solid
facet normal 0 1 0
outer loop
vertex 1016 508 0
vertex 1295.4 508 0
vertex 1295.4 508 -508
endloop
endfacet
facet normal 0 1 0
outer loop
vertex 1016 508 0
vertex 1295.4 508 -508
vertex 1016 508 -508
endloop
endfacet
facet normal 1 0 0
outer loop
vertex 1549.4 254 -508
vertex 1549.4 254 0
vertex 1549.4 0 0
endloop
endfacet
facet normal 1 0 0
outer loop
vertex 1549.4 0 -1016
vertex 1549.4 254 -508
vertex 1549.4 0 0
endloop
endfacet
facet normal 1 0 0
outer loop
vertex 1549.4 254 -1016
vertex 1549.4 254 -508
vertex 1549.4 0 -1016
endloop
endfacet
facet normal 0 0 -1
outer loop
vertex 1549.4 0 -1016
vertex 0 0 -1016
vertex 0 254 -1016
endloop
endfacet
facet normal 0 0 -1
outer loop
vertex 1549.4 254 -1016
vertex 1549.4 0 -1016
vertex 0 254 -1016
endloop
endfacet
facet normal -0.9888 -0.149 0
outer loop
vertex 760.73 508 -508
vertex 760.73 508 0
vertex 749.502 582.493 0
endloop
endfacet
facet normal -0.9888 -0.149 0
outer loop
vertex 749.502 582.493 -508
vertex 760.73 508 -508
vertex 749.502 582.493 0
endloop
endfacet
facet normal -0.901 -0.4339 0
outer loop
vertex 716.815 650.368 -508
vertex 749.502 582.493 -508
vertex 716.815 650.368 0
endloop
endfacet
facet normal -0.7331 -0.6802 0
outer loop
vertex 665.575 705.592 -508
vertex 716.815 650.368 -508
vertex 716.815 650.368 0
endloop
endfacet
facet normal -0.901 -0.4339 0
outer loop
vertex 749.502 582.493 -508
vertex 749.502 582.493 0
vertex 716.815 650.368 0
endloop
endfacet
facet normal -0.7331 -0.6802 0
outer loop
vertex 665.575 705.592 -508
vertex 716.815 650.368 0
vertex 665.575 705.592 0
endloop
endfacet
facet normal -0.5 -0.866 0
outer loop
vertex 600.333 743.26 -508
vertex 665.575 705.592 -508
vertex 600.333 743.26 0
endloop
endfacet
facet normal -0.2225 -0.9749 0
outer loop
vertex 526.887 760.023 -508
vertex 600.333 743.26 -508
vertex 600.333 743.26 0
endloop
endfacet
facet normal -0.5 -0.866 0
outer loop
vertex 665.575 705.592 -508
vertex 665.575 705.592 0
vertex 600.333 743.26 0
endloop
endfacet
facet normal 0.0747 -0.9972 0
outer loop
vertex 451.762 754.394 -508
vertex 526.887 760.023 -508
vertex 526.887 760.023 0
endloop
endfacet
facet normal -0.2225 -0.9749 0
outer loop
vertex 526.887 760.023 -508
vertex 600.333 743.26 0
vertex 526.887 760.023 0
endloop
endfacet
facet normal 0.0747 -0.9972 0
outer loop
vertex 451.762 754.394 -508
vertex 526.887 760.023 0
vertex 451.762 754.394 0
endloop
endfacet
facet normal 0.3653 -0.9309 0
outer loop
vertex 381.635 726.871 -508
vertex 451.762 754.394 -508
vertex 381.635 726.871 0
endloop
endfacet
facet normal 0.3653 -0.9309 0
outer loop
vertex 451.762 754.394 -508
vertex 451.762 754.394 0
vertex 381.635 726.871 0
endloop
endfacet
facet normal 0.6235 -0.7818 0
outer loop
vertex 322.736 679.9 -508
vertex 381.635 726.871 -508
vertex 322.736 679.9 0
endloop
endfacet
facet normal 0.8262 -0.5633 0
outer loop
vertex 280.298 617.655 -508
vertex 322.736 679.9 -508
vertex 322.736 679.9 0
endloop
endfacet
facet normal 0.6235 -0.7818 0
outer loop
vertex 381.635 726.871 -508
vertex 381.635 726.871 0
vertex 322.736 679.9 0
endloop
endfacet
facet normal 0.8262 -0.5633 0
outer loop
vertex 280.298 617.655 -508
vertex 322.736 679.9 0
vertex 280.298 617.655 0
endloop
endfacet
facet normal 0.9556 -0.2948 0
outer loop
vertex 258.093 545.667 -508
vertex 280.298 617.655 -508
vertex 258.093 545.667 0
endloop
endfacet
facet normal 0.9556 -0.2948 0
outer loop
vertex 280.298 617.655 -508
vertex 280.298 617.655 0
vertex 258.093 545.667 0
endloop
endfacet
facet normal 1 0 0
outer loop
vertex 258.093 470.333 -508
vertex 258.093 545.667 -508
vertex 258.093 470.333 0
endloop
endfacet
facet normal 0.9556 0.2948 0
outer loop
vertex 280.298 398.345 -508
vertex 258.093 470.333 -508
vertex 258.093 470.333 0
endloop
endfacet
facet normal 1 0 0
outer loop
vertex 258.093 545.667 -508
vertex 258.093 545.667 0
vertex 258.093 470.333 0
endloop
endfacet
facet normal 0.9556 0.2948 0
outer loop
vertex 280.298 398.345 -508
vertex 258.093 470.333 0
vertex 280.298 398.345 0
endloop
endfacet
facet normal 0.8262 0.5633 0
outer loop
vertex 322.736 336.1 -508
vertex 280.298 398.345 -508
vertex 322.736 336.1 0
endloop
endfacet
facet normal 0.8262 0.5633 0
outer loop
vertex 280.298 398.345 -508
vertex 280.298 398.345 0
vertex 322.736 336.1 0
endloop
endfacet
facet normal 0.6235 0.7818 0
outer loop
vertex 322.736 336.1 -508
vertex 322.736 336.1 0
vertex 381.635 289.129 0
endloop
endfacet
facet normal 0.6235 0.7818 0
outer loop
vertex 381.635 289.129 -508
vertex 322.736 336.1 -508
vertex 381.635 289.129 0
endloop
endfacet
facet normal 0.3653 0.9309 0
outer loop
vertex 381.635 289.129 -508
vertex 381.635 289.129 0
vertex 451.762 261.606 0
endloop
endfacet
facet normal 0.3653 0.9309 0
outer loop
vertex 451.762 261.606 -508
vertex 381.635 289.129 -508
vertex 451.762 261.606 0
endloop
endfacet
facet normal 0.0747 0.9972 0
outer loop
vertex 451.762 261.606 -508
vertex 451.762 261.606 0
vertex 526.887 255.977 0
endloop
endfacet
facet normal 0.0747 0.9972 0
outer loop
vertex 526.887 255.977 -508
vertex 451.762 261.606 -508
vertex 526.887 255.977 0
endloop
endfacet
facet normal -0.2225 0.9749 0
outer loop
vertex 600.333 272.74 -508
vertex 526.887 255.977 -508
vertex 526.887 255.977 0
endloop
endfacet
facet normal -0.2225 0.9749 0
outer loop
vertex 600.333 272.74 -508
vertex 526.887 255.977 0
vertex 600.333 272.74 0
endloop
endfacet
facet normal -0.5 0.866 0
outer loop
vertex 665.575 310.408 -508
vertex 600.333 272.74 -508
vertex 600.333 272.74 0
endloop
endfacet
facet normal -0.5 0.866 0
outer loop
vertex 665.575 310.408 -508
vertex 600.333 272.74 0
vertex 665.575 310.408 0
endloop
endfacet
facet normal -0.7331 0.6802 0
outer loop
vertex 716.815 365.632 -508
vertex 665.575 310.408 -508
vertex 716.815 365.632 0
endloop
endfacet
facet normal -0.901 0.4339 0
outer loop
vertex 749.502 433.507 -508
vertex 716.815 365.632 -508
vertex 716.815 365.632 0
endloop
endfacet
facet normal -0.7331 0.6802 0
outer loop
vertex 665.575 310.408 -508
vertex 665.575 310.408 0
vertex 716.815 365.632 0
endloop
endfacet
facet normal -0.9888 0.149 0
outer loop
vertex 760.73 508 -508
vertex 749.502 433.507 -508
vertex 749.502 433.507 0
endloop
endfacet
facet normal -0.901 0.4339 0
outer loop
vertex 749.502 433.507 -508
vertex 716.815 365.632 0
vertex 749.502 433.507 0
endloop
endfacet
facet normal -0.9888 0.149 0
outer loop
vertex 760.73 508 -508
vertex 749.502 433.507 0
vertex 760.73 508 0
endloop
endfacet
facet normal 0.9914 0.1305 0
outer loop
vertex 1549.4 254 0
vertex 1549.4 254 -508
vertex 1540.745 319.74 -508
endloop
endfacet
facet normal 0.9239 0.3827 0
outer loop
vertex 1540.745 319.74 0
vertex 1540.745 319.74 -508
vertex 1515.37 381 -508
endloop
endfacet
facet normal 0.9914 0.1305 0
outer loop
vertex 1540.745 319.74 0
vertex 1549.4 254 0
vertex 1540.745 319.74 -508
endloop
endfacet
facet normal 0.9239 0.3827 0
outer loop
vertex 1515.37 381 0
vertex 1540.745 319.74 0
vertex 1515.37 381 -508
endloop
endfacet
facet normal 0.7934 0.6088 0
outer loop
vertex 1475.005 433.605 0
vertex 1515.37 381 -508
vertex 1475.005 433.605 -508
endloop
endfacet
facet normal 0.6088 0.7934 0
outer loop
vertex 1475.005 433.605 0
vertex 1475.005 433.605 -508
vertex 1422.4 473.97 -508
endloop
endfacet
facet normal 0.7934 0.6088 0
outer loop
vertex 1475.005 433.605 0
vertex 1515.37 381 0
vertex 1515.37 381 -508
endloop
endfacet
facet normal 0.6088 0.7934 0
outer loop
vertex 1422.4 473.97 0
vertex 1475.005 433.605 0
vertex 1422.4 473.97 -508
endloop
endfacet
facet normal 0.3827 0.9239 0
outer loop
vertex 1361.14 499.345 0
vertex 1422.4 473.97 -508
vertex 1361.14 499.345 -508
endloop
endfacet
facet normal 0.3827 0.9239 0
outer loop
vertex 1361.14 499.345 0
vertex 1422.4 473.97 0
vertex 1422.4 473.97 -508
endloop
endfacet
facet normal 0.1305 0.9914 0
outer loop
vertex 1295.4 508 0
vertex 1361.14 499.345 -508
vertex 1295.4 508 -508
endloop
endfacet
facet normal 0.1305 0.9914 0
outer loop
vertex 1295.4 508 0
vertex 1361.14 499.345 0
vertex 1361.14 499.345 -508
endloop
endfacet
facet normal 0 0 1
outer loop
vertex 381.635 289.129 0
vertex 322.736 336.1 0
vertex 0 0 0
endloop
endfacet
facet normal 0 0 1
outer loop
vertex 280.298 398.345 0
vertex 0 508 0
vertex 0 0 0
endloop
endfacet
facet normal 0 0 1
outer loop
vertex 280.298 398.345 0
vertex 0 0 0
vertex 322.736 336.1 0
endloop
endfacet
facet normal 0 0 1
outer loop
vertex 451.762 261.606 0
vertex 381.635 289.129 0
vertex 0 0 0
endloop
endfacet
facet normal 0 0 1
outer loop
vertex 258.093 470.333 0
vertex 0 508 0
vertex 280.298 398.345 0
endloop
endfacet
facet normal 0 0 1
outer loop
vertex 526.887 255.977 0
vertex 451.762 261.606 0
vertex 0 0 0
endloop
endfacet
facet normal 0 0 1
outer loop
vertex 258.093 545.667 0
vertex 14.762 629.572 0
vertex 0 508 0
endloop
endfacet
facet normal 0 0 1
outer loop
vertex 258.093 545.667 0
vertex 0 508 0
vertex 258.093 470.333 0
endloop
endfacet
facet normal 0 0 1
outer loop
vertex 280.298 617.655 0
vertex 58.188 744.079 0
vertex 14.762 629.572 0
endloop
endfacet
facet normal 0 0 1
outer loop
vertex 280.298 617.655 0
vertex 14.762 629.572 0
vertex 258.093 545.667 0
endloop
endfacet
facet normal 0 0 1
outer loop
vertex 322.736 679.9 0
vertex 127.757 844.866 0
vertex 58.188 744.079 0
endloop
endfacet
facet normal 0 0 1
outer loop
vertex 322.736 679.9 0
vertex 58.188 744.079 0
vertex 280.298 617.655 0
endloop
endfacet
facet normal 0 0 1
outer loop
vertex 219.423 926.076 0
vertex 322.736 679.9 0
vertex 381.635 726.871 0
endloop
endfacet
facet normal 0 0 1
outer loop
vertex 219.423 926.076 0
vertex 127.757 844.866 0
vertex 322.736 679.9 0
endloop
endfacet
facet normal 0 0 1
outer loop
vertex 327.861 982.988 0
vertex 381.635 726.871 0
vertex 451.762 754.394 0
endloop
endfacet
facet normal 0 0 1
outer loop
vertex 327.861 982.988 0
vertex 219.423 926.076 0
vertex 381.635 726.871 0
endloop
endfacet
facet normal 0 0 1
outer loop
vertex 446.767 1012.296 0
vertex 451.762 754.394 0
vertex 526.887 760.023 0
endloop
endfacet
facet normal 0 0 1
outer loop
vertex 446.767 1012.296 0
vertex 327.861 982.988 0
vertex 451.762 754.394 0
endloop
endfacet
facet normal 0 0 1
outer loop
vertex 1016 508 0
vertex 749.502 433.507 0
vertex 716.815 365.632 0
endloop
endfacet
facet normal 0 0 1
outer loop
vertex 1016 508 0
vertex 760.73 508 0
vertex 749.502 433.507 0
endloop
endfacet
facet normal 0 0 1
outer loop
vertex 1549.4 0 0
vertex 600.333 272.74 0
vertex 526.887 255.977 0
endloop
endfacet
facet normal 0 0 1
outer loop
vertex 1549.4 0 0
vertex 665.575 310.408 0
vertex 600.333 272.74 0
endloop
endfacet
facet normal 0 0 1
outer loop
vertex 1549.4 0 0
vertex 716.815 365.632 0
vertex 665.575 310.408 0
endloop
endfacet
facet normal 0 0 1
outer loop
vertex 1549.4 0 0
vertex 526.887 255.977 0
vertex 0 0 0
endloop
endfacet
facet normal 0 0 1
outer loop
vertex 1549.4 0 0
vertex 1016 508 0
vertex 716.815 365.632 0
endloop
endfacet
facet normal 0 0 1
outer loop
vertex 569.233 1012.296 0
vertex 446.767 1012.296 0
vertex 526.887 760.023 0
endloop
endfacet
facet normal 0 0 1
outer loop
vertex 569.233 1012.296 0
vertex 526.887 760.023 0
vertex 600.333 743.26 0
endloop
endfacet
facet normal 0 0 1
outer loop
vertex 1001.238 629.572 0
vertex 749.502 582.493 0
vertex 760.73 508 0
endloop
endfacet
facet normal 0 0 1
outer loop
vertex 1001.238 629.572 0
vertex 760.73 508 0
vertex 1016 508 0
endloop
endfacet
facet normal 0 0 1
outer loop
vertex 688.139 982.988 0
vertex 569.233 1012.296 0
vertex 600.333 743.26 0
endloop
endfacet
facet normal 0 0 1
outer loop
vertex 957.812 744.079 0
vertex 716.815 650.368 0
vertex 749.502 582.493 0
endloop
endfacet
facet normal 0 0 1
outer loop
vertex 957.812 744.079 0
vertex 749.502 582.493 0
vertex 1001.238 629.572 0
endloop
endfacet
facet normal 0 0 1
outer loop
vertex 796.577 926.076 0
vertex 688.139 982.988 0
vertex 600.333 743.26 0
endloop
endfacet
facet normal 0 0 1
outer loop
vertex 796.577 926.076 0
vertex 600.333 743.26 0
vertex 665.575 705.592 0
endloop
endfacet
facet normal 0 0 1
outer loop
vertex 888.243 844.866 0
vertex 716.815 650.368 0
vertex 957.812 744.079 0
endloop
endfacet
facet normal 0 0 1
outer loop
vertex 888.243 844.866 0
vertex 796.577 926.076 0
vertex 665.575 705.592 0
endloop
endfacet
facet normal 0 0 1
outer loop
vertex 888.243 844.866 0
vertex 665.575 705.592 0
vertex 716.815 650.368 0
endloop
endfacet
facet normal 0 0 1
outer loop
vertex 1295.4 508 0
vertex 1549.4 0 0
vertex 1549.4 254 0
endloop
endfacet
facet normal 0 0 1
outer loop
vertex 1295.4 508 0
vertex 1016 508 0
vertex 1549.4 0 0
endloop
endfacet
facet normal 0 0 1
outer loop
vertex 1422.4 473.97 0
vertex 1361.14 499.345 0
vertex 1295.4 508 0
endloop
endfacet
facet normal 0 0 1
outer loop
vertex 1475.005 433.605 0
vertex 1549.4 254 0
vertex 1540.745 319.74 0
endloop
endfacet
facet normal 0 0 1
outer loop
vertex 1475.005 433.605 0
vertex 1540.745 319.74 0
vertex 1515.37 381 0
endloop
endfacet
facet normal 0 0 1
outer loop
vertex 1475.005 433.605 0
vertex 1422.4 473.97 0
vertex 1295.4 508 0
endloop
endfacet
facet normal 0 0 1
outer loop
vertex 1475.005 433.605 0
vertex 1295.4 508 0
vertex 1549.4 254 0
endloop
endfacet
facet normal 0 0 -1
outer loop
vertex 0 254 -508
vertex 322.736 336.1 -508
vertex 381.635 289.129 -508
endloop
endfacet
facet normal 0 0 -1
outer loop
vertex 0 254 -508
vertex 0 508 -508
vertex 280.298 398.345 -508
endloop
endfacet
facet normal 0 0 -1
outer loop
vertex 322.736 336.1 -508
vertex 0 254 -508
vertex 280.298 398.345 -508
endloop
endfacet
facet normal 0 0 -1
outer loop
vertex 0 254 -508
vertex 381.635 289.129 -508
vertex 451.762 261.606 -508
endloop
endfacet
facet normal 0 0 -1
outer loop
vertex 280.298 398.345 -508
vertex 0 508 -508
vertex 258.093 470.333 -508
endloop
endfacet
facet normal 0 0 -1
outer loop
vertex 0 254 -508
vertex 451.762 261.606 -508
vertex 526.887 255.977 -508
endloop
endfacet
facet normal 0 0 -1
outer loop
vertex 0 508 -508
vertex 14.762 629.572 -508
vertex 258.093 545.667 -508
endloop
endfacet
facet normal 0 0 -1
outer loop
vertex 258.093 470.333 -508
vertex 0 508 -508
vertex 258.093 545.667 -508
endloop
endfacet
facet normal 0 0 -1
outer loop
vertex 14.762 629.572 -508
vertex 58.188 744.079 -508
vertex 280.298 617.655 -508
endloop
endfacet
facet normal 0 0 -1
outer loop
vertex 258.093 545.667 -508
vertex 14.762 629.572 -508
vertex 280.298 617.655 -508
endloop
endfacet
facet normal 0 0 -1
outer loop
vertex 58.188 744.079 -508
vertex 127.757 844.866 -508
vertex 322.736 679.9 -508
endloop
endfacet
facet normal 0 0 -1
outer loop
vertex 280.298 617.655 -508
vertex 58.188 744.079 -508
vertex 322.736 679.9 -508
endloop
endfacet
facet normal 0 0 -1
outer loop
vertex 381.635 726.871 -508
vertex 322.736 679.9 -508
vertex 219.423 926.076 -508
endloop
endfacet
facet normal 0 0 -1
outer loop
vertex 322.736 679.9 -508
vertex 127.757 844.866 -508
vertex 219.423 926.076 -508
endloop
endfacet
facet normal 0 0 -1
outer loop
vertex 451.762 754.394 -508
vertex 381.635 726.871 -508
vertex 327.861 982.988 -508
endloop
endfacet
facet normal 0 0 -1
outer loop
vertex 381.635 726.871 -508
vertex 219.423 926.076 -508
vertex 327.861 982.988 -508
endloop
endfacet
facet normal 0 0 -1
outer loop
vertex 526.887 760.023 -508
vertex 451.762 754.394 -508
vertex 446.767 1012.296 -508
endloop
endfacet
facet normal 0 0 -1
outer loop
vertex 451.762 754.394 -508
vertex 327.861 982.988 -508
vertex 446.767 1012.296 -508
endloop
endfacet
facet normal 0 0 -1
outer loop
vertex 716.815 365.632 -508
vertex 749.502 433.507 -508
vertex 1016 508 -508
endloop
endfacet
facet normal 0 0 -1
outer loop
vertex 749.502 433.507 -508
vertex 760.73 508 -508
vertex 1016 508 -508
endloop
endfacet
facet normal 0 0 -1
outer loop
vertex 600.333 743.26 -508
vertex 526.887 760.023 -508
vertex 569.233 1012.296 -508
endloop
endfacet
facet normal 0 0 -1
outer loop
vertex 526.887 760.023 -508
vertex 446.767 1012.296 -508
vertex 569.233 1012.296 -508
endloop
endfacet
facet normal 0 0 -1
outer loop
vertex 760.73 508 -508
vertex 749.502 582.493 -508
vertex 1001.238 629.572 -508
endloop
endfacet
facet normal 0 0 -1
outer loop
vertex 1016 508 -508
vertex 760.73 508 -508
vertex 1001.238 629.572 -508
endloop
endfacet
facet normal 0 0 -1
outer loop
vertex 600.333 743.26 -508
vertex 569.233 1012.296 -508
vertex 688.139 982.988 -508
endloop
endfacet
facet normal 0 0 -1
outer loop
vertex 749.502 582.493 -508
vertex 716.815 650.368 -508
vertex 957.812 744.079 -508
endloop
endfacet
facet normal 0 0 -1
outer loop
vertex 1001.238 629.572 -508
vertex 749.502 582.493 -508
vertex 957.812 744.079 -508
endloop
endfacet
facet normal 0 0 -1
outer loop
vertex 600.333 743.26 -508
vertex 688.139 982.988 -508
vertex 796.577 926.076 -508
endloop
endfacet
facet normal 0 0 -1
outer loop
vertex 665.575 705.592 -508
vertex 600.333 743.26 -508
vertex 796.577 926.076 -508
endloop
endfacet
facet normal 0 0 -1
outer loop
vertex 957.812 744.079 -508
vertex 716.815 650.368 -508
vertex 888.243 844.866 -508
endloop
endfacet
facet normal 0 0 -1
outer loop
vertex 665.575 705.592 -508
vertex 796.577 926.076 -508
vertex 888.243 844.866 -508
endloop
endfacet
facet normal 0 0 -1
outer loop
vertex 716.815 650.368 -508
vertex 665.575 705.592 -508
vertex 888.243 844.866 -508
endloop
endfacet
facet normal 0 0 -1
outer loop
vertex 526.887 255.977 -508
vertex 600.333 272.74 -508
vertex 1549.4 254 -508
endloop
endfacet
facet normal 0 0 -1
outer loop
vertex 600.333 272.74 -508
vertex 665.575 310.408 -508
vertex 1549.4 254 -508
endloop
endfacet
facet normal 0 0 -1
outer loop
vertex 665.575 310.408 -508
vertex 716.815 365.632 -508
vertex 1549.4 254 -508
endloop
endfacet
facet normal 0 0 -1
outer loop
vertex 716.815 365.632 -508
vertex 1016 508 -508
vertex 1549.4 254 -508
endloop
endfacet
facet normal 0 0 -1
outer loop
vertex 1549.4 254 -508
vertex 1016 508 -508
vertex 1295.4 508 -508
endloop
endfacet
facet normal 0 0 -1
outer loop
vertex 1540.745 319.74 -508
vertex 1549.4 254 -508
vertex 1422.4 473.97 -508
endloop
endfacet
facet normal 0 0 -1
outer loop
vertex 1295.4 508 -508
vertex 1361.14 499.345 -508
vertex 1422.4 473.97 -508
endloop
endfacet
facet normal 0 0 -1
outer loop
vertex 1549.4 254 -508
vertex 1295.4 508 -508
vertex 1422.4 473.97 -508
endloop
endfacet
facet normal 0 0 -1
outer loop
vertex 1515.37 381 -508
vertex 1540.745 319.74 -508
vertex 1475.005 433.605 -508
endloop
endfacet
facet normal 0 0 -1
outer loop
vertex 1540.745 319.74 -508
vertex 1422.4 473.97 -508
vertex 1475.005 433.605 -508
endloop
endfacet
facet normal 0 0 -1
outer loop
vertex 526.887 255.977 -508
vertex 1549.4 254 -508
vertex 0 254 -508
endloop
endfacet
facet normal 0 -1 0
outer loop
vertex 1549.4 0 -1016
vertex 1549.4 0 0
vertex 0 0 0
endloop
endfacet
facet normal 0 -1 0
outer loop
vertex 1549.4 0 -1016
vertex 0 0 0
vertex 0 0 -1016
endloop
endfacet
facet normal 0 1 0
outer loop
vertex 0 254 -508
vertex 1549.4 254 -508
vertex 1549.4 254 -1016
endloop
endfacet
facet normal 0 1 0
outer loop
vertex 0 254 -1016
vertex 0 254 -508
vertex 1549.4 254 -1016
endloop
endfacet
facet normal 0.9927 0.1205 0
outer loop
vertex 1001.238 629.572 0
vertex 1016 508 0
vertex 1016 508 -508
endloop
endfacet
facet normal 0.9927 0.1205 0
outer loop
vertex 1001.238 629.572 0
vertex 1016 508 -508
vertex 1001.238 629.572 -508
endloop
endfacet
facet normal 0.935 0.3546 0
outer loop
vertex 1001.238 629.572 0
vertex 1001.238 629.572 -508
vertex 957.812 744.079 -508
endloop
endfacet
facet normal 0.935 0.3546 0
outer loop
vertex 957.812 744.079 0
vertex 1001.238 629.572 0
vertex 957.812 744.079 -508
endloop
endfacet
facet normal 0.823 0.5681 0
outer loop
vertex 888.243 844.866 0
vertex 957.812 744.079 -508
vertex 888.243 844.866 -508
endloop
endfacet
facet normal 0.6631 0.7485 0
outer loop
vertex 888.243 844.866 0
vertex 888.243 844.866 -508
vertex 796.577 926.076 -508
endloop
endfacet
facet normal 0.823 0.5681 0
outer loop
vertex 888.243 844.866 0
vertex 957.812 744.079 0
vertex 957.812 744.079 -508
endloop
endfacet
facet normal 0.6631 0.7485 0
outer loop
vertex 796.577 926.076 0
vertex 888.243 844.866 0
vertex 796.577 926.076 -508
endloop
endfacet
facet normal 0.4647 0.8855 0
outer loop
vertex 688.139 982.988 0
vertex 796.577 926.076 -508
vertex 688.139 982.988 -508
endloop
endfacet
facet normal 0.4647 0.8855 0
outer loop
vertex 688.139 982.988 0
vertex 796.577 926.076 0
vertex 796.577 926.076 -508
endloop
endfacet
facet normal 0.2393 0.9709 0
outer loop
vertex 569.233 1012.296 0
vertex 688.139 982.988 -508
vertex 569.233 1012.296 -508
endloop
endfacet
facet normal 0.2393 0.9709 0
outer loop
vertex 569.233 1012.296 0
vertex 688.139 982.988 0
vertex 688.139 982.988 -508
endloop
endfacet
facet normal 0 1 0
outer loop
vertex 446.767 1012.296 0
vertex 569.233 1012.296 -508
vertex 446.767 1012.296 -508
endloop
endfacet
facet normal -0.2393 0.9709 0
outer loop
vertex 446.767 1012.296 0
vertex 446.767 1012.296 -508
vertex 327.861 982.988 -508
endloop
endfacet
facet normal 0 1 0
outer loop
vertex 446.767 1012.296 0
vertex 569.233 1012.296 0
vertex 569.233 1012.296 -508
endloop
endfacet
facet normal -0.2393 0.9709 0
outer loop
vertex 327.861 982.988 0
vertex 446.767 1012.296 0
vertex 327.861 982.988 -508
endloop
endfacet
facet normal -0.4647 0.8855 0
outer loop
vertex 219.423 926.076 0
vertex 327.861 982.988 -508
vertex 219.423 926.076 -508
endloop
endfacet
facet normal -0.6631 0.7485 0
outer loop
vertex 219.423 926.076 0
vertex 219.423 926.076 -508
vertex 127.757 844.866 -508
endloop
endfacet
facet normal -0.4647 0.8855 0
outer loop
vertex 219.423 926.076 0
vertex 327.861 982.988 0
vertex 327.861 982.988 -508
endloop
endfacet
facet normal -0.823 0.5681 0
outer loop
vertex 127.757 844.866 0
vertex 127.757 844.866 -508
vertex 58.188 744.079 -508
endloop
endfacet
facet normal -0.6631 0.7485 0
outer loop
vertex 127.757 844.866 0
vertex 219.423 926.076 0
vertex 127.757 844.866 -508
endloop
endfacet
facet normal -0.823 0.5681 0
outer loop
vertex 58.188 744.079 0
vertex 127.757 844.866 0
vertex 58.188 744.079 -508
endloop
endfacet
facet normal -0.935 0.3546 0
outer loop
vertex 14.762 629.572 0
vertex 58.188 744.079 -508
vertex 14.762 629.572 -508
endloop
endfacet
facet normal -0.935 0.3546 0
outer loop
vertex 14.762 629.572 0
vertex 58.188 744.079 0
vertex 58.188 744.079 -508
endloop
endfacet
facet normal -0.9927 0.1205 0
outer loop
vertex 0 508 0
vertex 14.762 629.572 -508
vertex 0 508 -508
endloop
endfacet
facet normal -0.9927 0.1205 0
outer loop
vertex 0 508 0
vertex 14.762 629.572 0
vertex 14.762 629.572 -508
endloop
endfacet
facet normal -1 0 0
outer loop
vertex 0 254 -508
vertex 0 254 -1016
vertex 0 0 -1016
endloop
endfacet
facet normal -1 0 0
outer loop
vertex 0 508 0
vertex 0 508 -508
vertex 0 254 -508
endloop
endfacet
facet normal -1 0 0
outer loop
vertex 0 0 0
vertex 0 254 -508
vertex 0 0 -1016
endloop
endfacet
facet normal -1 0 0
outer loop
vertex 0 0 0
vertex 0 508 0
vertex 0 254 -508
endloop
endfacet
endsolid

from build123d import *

# Parameters (mm, degrees)
SKETCH1_W           = 1016
SKETCH1_H           = 254
BOSS_EXTRUDE1_DEPTH = 1549.4
SKETCH2_R           = 252.73
BOSS_EXTRUDE2_DEPTH = 508


with BuildPart() as part:
    # Sketch1 → Boss-Extrude1 (new body)
    with BuildSketch(Plane(origin=(0, 0, 0), x_dir=(0, 0, -1), z_dir=(1, 0, 0))):
        with Locations((508, 127)):
            Rectangle(SKETCH1_W, SKETCH1_H)
    extrude(amount=BOSS_EXTRUDE1_DEPTH)

    # Sketch2 → Boss-Extrude2 (add)
    with BuildSketch(Plane.XY):
        with BuildLine():
            Line((0, 508), (0, 254))
            Line((0, 254), (1549.4, 254))
            ThreePointArc((1549.4, 254), (1475.005122421, 433.605122421), (1295.4, 508))
            Line((1295.4, 508), (1016, 508))
            ThreePointArc((1016, 508), (508, 1016), (0, 508))
        make_face()
        with Locations((508, 508)):
            Circle(SKETCH2_R, mode=Mode.SUBTRACT)
    extrude(amount=-BOSS_EXTRUDE2_DEPTH)


solid = part.part
